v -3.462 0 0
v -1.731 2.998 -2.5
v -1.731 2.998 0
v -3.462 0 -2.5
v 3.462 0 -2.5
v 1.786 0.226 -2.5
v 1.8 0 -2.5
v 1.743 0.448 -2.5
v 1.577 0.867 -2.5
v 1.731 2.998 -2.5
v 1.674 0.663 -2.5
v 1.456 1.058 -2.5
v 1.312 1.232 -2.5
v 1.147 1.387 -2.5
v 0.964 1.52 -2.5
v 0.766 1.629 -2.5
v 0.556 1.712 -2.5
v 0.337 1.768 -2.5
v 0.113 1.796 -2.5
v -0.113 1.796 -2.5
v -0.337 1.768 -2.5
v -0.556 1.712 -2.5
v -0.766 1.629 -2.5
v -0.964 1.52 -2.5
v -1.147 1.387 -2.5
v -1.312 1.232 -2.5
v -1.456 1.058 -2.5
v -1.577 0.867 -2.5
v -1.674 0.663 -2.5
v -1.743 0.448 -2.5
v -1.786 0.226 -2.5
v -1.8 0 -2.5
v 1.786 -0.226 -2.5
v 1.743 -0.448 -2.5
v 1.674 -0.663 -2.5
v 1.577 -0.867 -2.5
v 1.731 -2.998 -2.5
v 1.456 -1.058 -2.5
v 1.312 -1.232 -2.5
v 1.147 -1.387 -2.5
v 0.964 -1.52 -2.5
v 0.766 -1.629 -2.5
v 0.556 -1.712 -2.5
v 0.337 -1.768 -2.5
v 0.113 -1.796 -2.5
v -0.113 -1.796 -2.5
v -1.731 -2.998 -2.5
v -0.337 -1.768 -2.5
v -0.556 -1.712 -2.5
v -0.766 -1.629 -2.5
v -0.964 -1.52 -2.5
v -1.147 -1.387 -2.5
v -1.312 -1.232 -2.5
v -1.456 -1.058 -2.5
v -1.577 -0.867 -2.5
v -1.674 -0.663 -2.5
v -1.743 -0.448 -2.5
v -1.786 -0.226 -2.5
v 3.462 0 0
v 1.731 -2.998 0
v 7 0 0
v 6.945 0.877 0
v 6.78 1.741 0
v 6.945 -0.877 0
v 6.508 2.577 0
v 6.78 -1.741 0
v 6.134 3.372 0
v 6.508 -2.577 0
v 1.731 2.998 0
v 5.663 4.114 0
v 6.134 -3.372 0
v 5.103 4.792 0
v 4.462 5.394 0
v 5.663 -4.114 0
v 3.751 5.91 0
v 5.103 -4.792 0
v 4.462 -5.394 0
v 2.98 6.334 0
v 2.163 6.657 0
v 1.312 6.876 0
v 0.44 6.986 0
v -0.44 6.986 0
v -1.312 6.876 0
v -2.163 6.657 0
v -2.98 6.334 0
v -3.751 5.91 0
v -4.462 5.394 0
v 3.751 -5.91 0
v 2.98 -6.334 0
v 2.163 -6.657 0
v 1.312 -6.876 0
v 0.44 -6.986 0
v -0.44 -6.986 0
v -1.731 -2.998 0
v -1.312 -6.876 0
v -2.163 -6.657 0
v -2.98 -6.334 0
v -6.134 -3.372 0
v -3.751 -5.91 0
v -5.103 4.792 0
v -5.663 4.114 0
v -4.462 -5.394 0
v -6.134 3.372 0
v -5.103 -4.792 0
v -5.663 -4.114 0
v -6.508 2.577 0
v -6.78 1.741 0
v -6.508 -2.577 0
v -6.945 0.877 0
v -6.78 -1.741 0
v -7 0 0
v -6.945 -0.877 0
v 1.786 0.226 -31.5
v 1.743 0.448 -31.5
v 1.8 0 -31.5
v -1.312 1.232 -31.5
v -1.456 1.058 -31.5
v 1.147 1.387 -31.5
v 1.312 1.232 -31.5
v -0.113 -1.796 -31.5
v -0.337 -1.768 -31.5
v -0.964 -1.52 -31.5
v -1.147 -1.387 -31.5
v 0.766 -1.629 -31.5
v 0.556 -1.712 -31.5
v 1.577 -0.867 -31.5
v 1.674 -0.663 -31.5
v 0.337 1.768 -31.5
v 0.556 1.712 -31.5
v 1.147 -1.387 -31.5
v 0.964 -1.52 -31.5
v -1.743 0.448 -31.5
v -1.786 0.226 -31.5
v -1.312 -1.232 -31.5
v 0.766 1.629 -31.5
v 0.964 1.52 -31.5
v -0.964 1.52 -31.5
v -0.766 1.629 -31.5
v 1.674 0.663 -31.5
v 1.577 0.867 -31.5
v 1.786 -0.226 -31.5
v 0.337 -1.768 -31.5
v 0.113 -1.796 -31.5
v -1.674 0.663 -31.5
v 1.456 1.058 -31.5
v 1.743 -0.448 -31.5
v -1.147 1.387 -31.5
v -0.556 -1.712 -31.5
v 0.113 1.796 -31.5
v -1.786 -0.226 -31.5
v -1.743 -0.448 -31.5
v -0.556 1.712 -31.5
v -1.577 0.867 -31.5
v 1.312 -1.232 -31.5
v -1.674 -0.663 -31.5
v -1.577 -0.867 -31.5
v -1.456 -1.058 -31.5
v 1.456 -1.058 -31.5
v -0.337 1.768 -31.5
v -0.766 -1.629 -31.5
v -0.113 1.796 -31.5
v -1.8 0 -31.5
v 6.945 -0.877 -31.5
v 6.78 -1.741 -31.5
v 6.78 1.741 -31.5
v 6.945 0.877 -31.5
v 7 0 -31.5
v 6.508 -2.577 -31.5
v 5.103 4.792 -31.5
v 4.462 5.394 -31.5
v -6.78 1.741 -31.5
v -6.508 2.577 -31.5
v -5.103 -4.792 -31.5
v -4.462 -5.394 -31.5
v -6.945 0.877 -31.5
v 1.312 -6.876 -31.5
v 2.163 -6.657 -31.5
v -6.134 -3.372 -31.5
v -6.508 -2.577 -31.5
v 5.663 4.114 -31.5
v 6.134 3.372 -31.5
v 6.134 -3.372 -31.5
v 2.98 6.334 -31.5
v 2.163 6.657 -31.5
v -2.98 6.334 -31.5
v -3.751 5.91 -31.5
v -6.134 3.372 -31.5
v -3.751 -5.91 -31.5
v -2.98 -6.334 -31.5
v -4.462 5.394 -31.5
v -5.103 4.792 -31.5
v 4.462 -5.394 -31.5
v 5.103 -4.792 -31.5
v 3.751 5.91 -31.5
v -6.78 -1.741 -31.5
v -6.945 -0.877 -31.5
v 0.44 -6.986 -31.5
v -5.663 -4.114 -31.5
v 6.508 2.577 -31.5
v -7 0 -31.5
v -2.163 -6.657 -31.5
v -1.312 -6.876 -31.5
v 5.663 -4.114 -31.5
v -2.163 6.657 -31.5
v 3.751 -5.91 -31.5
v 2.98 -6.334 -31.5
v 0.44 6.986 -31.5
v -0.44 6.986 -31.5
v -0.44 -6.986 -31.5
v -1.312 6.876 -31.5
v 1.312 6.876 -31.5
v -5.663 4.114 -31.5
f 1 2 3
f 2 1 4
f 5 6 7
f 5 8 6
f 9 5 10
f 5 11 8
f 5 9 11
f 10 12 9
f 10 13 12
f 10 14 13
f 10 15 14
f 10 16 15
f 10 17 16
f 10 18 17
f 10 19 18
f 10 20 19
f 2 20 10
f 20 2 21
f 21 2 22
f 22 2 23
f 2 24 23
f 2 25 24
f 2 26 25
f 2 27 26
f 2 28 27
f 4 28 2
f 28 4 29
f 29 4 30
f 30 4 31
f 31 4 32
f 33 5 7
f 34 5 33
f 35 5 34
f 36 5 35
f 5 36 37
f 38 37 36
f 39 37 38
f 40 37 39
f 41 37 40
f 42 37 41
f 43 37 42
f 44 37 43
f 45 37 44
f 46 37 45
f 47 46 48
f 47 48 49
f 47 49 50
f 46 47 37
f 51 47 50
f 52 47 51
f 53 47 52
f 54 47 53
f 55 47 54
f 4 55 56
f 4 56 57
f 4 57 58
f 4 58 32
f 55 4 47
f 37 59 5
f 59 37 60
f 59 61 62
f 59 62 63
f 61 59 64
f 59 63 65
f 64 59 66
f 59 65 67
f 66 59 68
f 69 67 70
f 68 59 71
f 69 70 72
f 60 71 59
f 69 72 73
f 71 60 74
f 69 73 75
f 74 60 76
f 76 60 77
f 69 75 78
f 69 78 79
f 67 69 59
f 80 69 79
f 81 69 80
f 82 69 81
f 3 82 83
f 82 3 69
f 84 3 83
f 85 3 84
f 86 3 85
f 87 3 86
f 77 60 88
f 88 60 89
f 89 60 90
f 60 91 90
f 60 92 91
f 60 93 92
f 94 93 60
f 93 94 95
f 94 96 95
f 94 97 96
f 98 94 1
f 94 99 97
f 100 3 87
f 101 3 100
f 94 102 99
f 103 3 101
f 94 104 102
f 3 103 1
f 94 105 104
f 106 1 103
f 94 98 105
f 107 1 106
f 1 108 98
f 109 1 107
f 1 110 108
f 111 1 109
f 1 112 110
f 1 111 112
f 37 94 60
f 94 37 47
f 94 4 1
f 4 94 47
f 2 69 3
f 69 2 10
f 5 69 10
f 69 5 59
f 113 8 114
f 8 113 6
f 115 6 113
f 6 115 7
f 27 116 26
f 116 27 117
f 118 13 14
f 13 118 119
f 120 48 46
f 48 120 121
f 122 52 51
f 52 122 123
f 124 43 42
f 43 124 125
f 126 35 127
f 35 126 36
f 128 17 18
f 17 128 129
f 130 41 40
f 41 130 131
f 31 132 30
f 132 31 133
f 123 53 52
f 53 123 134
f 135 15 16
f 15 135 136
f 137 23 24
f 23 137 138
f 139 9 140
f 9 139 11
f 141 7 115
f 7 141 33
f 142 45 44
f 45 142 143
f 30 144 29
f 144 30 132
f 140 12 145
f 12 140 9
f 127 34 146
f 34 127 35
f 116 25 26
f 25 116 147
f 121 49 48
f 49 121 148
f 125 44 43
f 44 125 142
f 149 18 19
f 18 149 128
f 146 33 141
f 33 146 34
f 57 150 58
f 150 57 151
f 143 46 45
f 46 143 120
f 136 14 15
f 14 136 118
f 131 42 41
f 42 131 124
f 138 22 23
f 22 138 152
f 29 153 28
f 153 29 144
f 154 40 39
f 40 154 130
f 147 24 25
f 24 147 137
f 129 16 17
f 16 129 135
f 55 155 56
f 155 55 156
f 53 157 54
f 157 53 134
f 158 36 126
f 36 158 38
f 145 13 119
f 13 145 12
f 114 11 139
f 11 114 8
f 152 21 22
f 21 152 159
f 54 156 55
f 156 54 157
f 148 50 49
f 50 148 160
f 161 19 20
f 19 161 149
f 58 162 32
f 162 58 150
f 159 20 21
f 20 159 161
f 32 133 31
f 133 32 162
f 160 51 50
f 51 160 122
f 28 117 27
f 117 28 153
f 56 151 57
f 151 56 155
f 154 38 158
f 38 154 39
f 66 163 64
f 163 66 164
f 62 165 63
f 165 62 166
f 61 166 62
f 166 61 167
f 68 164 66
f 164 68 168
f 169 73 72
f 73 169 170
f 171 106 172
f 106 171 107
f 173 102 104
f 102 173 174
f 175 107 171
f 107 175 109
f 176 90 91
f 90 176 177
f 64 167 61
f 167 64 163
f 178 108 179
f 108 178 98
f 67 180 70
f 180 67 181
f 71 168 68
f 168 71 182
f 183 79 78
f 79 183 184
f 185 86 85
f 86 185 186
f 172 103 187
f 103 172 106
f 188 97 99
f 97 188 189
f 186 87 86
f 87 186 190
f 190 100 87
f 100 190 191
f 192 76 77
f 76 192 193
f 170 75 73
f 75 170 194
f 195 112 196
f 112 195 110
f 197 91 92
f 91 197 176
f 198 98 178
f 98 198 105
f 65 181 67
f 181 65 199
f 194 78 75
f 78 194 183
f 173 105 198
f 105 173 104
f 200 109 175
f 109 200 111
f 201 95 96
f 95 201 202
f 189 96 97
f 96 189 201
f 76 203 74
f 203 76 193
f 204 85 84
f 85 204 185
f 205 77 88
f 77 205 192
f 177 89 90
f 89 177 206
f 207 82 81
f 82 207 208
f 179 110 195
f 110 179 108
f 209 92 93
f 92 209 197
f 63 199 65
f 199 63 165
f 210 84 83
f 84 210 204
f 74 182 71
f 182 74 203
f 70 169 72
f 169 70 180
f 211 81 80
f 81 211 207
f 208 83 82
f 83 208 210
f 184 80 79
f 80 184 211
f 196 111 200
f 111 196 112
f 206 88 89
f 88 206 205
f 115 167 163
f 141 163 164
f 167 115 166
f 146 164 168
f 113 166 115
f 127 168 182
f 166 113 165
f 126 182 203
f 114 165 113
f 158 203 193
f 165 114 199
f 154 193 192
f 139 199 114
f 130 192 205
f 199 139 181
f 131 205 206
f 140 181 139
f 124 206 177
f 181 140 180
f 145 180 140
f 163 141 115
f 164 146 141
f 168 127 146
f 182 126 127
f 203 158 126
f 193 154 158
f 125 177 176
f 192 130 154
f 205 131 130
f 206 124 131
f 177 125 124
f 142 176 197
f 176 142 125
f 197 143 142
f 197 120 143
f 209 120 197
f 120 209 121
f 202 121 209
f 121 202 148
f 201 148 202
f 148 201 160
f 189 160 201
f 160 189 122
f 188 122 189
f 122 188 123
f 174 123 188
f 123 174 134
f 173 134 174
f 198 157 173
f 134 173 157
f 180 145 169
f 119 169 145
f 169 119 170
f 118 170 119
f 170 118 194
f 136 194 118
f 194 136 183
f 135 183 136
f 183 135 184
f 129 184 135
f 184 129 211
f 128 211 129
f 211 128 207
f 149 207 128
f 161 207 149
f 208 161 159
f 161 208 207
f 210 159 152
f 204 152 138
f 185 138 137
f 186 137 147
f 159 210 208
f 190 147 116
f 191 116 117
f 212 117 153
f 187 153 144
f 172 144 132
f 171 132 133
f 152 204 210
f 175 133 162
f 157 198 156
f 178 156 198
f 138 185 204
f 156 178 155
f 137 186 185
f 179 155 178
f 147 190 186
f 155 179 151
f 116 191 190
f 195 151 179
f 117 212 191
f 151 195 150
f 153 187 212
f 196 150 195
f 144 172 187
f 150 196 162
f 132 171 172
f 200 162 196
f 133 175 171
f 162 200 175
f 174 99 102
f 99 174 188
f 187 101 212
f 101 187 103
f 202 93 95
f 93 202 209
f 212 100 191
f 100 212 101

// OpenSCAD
$fn = 50;

difference() {
	union() {
		translate(v = [0, 0, -31.5]) {
			cylinder(h = 31.5, r = 7.0);
		}
	}
	union() {
		translate(v = [0, 0, 0]) {
			rotate(a = [0, 0, 0]) {
				difference() {
					union() {
						translate(v = [0, 0, -2.5]) {
							linear_extrude(height = 2.5) {
								polygon(points = [[3.4619999999999997, 0.0], [1.7310000000000003, 2.9981799479017264], [-1.7309999999999992, 2.9981799479017264], [-3.4619999999999997, 4.2397272186481365e-16], [-1.7310000000000014, -2.998179947901726], [1.7309999999999977, -2.9981799479017277]]);
							}
						}
					}
					union();
				}
			}
		}
		#translate(v = [0, 0, -100.0]) {
			cylinder(h = 200, r = 1.8);
		}
	}
}
